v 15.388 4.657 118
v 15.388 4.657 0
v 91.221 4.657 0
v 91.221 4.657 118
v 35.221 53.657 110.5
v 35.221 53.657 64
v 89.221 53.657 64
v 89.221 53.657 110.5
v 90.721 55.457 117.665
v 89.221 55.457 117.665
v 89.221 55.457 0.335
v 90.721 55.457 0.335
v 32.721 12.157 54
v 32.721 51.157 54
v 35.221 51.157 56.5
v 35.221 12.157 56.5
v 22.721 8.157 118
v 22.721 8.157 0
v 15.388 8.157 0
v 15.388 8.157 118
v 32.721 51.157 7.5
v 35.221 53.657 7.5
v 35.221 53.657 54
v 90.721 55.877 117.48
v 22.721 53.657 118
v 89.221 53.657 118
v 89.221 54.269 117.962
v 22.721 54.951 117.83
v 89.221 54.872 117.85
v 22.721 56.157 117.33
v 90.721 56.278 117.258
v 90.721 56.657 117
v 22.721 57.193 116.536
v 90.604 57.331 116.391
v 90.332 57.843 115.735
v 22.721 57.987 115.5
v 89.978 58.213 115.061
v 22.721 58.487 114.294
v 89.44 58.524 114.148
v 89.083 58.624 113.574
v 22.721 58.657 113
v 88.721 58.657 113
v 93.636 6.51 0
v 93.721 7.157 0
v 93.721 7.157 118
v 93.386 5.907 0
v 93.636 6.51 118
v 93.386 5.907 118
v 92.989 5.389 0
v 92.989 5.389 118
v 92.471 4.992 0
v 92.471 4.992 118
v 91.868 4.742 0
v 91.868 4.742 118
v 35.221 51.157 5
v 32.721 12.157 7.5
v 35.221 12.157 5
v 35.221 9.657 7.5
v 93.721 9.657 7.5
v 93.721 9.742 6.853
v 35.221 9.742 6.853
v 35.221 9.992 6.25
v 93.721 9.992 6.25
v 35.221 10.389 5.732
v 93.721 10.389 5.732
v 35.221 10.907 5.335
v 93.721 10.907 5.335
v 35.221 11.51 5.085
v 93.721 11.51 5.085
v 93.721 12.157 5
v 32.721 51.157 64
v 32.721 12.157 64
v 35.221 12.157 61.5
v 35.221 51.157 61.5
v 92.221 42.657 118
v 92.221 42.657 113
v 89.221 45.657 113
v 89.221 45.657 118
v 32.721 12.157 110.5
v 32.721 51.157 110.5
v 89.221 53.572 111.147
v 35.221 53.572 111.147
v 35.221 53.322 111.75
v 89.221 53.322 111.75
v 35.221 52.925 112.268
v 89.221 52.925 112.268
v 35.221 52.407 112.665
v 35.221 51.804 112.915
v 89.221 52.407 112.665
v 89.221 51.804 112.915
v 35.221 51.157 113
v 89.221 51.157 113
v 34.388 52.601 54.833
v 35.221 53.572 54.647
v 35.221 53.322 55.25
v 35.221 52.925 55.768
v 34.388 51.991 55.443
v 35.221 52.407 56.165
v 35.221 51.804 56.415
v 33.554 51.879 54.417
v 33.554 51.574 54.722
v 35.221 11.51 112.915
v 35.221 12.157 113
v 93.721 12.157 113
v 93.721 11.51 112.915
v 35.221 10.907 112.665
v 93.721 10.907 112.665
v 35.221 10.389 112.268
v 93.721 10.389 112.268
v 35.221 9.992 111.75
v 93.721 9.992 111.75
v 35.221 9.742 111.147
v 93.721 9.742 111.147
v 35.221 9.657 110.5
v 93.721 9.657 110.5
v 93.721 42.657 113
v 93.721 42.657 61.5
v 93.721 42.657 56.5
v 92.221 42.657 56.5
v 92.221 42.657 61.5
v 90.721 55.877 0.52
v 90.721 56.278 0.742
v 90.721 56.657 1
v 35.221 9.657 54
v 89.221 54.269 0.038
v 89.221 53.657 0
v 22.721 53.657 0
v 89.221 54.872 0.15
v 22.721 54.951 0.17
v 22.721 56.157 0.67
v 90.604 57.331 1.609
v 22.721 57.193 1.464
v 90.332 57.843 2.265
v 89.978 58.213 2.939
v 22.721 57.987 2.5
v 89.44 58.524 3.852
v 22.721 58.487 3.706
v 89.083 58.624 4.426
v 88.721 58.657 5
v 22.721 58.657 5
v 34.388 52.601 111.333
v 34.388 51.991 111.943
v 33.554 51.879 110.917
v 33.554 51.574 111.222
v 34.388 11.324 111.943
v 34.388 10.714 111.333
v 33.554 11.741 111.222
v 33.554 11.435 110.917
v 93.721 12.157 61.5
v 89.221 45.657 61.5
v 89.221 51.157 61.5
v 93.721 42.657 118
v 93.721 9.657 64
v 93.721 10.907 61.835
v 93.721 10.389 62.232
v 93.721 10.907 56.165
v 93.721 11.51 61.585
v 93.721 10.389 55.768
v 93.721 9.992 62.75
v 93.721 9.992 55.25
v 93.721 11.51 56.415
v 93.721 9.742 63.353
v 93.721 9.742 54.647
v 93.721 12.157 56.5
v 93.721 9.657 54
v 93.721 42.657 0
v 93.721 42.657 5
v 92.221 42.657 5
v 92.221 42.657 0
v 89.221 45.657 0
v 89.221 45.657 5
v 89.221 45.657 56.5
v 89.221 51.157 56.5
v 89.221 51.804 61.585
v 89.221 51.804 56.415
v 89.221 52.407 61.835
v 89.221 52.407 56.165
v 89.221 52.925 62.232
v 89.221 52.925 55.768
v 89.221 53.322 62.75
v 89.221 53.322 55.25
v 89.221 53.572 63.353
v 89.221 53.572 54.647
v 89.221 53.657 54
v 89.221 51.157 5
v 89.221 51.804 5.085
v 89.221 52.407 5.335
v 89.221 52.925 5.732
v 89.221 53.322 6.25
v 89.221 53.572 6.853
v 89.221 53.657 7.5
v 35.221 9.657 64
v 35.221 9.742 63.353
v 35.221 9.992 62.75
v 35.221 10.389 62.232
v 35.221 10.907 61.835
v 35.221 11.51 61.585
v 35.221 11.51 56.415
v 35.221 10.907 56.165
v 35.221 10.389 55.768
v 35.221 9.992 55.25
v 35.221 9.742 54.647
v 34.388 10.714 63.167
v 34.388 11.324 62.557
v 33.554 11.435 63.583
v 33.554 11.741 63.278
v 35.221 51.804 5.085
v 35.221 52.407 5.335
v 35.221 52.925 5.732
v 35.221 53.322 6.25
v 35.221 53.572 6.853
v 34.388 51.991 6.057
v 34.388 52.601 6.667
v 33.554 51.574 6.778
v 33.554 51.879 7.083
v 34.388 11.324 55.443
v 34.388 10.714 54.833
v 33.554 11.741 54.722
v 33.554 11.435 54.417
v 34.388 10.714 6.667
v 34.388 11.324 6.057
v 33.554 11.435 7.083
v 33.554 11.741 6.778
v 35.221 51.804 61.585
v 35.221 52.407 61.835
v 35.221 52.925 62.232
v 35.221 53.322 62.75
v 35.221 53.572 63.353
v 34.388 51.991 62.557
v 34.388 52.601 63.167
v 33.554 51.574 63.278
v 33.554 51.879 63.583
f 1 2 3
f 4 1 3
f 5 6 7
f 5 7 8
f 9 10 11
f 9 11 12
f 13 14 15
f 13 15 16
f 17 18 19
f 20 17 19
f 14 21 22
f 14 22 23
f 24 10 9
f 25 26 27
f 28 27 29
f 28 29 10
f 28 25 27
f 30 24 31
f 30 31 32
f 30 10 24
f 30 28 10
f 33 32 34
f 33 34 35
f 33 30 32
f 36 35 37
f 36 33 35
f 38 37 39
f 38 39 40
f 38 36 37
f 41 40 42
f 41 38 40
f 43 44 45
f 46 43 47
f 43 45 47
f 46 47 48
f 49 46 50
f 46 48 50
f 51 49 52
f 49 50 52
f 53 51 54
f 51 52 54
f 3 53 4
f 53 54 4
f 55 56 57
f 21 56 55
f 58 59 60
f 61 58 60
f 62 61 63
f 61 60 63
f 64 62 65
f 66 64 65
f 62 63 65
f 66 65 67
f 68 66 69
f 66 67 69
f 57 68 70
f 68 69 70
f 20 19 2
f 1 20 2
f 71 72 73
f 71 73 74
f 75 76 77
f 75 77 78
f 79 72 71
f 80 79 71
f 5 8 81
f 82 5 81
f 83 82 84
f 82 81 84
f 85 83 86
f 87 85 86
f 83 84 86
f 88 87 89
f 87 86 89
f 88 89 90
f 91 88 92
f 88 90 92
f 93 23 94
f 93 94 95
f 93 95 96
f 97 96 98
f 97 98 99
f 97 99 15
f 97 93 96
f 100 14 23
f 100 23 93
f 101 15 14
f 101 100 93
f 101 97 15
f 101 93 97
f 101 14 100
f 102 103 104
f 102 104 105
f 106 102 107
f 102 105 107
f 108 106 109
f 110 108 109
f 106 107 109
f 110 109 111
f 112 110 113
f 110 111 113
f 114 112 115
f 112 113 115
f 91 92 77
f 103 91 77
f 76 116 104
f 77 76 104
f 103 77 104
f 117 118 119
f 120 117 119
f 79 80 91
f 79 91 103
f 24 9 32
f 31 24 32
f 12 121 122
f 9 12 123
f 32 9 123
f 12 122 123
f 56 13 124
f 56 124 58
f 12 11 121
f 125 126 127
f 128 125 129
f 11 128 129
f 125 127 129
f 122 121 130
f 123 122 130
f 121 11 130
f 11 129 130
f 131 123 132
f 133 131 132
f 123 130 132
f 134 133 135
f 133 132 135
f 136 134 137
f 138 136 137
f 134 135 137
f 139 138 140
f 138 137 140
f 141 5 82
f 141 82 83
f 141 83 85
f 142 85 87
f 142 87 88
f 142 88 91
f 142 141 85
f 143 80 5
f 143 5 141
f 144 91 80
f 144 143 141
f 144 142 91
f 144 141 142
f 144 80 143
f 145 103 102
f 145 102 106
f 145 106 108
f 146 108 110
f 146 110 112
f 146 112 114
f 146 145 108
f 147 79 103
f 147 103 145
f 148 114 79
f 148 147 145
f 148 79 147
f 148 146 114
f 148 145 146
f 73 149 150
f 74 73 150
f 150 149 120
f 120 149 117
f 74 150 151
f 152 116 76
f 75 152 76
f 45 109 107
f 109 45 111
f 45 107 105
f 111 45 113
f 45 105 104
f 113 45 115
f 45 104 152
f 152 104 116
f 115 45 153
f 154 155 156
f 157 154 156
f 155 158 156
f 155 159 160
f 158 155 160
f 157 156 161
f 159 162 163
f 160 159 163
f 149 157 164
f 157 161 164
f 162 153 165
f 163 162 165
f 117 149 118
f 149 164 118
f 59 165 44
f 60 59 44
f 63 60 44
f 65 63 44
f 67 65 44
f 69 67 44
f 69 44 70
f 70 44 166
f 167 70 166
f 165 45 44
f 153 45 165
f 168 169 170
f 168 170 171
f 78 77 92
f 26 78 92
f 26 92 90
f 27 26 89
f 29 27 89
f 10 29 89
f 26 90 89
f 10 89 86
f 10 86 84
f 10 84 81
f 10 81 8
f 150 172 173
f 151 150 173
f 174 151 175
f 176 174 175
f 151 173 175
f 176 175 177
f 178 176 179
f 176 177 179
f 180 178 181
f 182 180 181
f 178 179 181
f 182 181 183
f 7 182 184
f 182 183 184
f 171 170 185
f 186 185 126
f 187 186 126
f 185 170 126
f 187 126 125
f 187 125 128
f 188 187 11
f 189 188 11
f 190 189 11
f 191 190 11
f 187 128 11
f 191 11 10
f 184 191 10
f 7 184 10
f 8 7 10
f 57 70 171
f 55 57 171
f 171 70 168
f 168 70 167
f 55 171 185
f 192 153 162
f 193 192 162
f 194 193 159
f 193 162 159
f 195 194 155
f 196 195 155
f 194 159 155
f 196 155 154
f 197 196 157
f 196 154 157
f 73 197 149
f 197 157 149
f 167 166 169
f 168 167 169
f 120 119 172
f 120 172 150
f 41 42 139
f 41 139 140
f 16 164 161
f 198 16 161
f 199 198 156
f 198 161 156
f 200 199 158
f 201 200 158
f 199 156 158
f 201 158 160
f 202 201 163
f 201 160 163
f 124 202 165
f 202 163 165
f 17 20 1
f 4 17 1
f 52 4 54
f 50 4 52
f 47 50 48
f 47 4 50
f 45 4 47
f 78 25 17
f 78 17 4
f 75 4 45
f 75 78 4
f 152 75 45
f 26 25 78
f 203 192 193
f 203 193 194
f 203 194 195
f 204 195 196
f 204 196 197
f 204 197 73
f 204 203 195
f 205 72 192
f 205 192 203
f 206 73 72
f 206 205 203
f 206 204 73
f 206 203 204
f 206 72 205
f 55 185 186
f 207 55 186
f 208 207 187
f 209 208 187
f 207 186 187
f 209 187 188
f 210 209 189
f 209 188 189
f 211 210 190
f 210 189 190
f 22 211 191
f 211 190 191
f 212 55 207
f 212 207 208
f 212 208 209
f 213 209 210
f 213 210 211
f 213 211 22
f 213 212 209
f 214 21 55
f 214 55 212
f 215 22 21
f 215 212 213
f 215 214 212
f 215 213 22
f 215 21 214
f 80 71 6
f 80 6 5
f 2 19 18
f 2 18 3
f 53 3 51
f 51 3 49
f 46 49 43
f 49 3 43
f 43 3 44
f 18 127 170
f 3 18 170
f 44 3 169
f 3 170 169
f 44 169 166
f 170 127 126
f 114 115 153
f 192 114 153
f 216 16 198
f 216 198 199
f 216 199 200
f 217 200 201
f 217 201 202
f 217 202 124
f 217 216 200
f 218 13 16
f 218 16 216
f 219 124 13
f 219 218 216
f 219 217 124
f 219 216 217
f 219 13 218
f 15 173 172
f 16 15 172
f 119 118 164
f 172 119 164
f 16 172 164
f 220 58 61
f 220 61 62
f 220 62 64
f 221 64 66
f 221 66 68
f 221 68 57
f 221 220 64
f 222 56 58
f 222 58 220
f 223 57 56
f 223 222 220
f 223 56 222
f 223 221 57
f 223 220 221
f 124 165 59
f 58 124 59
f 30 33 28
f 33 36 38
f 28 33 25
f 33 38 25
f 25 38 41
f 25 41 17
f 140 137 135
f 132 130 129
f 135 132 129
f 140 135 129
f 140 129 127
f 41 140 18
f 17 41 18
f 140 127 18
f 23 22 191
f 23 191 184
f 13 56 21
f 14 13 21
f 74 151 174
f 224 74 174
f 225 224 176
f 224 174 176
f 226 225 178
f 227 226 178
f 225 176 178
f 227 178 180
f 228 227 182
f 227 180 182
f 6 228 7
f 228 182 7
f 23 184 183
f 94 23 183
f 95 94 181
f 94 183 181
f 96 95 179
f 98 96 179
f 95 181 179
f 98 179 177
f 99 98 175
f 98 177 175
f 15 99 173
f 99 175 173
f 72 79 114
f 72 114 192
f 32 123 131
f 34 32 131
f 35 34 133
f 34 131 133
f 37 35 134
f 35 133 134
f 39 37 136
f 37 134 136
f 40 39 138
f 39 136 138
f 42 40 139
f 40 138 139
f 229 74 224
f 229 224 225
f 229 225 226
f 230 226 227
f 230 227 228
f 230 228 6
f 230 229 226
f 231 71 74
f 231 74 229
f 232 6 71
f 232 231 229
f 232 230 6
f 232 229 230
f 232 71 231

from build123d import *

# Parameters (mm, degrees)
F1_DEPTH    = 118
F4_DEPTH    = 61
F5_SIZE     = 2.49999
F6_R        = 5
F7_SIZE     = 3
F8_R        = 2.5
F9_T1_DEPTH = 118


# Not quite as in the source:
# - a fillet or chamfer that OpenCascade refuses, or shapes differently, is made with other operations: its cross-section is extruded or revolved along the edge and cut away or added
# - a fillet or chamfer is up to 0.001 mm smaller than in the source, because OpenCascade refuses the exact size


with BuildPart() as f1:
    # F0 (on Top) → F1 (new body)
    with BuildSketch(Plane.XY):
        Polygon((15.3875516164, 8.1571814393), (15.3875516164, 4.6571814393), (93.7208858402, 4.6571814393), (93.7208858402, 42.6571814393), (89.2208858402, 42.6571814393), (89.2208858402, 55.4571814393), (90.7208858402, 55.4571814393), (90.7208858402, 58.6571814393), (22.7208858402, 58.6571814393), (22.7208858402, 8.1571814393), align=None)
    extrude(amount=F1_DEPTH)

    # F3 (on face) → F4 (cut)
    with BuildSketch(Plane.YZ.offset(93.7208858402)):
        with BuildLine():
            Line((51.1571814393, 113), (42.6571814393, 113))
            Line((42.6571814393, 113), (42.6571814393, 61.5))
            Line((42.6571814393, 61.5), (51.1571814393, 61.5))
            ThreePointArc((51.1571814393, 61.5), (52.9249483923, 62.232233047), (53.6571814393, 64))
            Line((53.6571814393, 64), (53.6571814393, 110.5))
            ThreePointArc((53.6571814393, 110.5), (52.9249483923, 112.267766953), (51.1571814393, 113))
        make_face()
        with BuildLine():
            Line((42.6571814393, 61.5), (42.6571814393, 113))
            Line((42.6571814393, 113), (12.1571814393, 113))
            ThreePointArc((12.1571814393, 113), (10.3894144863, 112.267766953), (9.6571814393, 110.5))
            Line((9.6571814393, 110.5), (9.6571814393, 64))
            ThreePointArc((9.6571814393, 64), (10.3894144863, 62.232233047), (12.1571814393, 61.5))
            Line((12.1571814393, 61.5), (42.6571814393, 61.5))
        make_face()
        with BuildLine():
            Line((12.1571814393, 5), (42.6571814393, 5))
            Line((42.6571814393, 5), (42.6571814393, 56.5))
            Line((42.6571814393, 56.5), (12.1571814393, 56.5))
            ThreePointArc((12.1571814393, 56.5), (10.3894144863, 55.767766953), (9.6571814393, 54))
            Line((9.6571814393, 54), (9.6571814393, 7.5))
            ThreePointArc((9.6571814393, 7.5), (10.3894144863, 5.732233047), (12.1571814393, 5))
        make_face()
        with BuildLine():
            Line((42.6571814393, 56.5), (42.6571814393, 5))
            Line((42.6571814393, 5), (51.1571814393, 5))
            ThreePointArc((51.1571814393, 5), (52.9249483923, 5.732233047), (53.6571814393, 7.5))
            Line((53.6571814393, 7.5), (53.6571814393, 54))
            ThreePointArc((53.6571814393, 54), (52.9249483923, 55.767766953), (51.1571814393, 56.5))
            Line((51.1571814393, 56.5), (42.6571814393, 56.5))
        make_face()
    extrude(amount=-F4_DEPTH, mode=Mode.SUBTRACT)

    # F5 (size 2.5 in the source; OpenCascade refuses exactly that, so slightly less here)
    f5_edges = [f1.edges().sort_by_distance(p)[0] for p in [
        (32.720886, 52.924948, 112.267767),
        (32.720886, 31.657181, 113),
        (32.720886, 10.389414, 112.267767),
        (32.720886, 9.657181, 87.25),
        (32.720886, 10.389414, 62.232233),
        (32.720886, 31.657181, 61.5),
        (32.720886, 52.924948, 62.232233),
        (32.720886, 53.657181, 87.25),
        (32.720886, 10.389414, 5.732233),
        (32.720886, 31.657181, 5),
        (32.720886, 52.924948, 5.732233),
        (32.720886, 53.657181, 30.75),
        (32.720886, 52.924948, 55.767767),
        (32.720886, 31.657181, 56.5),
        (32.720886, 10.389414, 55.767767),
        (32.720886, 9.657181, 30.75),
    ]]
    chamfer(f5_edges, length=F5_SIZE)

    # F6
    f6_edges = [f1.edges().sort_by_distance(p)[0] for p in [
        (56.720886, 58.657181, 118),
        (56.720886, 58.657181, 0),
    ]]
    fillet(f6_edges, radius=F6_R)

    # F7
    f7_edges = [f1.edges().sort_by_distance(p)[0] for p in [
        (89.220886, 42.657181, 59),
        (89.220886, 42.657181, 2.5),
        (89.220886, 42.657181, 115.5),
    ]]
    chamfer(f7_edges, length=F7_SIZE)

    # F8
    f8_edges = [f1.edges().sort_by_distance(p)[0] for p in [
        (93.720886, 4.657181, 59),
    ]]
    fillet(f8_edges, radius=F8_R)

    # F9: fillet of radius 2 on 1 edges, made by hand

    # F9_s2 → F9_t1 (cut)
    with BuildSketch(Plane.XY):
        with BuildLine():
            ThreePointArc((90.7208858402, 56.6571814393), (90.1350994026, 58.0713950017), (88.7208858402, 58.6571814393))
            Line((88.7208858402, 58.6571814393), (90.7208858402, 58.6571814393))
            Line((90.7208858402, 58.6571814393), (90.7208858402, 56.6571814393))
        make_face()
    extrude(amount=F9_T1_DEPTH, mode=Mode.SUBTRACT)


solid = f1.part
